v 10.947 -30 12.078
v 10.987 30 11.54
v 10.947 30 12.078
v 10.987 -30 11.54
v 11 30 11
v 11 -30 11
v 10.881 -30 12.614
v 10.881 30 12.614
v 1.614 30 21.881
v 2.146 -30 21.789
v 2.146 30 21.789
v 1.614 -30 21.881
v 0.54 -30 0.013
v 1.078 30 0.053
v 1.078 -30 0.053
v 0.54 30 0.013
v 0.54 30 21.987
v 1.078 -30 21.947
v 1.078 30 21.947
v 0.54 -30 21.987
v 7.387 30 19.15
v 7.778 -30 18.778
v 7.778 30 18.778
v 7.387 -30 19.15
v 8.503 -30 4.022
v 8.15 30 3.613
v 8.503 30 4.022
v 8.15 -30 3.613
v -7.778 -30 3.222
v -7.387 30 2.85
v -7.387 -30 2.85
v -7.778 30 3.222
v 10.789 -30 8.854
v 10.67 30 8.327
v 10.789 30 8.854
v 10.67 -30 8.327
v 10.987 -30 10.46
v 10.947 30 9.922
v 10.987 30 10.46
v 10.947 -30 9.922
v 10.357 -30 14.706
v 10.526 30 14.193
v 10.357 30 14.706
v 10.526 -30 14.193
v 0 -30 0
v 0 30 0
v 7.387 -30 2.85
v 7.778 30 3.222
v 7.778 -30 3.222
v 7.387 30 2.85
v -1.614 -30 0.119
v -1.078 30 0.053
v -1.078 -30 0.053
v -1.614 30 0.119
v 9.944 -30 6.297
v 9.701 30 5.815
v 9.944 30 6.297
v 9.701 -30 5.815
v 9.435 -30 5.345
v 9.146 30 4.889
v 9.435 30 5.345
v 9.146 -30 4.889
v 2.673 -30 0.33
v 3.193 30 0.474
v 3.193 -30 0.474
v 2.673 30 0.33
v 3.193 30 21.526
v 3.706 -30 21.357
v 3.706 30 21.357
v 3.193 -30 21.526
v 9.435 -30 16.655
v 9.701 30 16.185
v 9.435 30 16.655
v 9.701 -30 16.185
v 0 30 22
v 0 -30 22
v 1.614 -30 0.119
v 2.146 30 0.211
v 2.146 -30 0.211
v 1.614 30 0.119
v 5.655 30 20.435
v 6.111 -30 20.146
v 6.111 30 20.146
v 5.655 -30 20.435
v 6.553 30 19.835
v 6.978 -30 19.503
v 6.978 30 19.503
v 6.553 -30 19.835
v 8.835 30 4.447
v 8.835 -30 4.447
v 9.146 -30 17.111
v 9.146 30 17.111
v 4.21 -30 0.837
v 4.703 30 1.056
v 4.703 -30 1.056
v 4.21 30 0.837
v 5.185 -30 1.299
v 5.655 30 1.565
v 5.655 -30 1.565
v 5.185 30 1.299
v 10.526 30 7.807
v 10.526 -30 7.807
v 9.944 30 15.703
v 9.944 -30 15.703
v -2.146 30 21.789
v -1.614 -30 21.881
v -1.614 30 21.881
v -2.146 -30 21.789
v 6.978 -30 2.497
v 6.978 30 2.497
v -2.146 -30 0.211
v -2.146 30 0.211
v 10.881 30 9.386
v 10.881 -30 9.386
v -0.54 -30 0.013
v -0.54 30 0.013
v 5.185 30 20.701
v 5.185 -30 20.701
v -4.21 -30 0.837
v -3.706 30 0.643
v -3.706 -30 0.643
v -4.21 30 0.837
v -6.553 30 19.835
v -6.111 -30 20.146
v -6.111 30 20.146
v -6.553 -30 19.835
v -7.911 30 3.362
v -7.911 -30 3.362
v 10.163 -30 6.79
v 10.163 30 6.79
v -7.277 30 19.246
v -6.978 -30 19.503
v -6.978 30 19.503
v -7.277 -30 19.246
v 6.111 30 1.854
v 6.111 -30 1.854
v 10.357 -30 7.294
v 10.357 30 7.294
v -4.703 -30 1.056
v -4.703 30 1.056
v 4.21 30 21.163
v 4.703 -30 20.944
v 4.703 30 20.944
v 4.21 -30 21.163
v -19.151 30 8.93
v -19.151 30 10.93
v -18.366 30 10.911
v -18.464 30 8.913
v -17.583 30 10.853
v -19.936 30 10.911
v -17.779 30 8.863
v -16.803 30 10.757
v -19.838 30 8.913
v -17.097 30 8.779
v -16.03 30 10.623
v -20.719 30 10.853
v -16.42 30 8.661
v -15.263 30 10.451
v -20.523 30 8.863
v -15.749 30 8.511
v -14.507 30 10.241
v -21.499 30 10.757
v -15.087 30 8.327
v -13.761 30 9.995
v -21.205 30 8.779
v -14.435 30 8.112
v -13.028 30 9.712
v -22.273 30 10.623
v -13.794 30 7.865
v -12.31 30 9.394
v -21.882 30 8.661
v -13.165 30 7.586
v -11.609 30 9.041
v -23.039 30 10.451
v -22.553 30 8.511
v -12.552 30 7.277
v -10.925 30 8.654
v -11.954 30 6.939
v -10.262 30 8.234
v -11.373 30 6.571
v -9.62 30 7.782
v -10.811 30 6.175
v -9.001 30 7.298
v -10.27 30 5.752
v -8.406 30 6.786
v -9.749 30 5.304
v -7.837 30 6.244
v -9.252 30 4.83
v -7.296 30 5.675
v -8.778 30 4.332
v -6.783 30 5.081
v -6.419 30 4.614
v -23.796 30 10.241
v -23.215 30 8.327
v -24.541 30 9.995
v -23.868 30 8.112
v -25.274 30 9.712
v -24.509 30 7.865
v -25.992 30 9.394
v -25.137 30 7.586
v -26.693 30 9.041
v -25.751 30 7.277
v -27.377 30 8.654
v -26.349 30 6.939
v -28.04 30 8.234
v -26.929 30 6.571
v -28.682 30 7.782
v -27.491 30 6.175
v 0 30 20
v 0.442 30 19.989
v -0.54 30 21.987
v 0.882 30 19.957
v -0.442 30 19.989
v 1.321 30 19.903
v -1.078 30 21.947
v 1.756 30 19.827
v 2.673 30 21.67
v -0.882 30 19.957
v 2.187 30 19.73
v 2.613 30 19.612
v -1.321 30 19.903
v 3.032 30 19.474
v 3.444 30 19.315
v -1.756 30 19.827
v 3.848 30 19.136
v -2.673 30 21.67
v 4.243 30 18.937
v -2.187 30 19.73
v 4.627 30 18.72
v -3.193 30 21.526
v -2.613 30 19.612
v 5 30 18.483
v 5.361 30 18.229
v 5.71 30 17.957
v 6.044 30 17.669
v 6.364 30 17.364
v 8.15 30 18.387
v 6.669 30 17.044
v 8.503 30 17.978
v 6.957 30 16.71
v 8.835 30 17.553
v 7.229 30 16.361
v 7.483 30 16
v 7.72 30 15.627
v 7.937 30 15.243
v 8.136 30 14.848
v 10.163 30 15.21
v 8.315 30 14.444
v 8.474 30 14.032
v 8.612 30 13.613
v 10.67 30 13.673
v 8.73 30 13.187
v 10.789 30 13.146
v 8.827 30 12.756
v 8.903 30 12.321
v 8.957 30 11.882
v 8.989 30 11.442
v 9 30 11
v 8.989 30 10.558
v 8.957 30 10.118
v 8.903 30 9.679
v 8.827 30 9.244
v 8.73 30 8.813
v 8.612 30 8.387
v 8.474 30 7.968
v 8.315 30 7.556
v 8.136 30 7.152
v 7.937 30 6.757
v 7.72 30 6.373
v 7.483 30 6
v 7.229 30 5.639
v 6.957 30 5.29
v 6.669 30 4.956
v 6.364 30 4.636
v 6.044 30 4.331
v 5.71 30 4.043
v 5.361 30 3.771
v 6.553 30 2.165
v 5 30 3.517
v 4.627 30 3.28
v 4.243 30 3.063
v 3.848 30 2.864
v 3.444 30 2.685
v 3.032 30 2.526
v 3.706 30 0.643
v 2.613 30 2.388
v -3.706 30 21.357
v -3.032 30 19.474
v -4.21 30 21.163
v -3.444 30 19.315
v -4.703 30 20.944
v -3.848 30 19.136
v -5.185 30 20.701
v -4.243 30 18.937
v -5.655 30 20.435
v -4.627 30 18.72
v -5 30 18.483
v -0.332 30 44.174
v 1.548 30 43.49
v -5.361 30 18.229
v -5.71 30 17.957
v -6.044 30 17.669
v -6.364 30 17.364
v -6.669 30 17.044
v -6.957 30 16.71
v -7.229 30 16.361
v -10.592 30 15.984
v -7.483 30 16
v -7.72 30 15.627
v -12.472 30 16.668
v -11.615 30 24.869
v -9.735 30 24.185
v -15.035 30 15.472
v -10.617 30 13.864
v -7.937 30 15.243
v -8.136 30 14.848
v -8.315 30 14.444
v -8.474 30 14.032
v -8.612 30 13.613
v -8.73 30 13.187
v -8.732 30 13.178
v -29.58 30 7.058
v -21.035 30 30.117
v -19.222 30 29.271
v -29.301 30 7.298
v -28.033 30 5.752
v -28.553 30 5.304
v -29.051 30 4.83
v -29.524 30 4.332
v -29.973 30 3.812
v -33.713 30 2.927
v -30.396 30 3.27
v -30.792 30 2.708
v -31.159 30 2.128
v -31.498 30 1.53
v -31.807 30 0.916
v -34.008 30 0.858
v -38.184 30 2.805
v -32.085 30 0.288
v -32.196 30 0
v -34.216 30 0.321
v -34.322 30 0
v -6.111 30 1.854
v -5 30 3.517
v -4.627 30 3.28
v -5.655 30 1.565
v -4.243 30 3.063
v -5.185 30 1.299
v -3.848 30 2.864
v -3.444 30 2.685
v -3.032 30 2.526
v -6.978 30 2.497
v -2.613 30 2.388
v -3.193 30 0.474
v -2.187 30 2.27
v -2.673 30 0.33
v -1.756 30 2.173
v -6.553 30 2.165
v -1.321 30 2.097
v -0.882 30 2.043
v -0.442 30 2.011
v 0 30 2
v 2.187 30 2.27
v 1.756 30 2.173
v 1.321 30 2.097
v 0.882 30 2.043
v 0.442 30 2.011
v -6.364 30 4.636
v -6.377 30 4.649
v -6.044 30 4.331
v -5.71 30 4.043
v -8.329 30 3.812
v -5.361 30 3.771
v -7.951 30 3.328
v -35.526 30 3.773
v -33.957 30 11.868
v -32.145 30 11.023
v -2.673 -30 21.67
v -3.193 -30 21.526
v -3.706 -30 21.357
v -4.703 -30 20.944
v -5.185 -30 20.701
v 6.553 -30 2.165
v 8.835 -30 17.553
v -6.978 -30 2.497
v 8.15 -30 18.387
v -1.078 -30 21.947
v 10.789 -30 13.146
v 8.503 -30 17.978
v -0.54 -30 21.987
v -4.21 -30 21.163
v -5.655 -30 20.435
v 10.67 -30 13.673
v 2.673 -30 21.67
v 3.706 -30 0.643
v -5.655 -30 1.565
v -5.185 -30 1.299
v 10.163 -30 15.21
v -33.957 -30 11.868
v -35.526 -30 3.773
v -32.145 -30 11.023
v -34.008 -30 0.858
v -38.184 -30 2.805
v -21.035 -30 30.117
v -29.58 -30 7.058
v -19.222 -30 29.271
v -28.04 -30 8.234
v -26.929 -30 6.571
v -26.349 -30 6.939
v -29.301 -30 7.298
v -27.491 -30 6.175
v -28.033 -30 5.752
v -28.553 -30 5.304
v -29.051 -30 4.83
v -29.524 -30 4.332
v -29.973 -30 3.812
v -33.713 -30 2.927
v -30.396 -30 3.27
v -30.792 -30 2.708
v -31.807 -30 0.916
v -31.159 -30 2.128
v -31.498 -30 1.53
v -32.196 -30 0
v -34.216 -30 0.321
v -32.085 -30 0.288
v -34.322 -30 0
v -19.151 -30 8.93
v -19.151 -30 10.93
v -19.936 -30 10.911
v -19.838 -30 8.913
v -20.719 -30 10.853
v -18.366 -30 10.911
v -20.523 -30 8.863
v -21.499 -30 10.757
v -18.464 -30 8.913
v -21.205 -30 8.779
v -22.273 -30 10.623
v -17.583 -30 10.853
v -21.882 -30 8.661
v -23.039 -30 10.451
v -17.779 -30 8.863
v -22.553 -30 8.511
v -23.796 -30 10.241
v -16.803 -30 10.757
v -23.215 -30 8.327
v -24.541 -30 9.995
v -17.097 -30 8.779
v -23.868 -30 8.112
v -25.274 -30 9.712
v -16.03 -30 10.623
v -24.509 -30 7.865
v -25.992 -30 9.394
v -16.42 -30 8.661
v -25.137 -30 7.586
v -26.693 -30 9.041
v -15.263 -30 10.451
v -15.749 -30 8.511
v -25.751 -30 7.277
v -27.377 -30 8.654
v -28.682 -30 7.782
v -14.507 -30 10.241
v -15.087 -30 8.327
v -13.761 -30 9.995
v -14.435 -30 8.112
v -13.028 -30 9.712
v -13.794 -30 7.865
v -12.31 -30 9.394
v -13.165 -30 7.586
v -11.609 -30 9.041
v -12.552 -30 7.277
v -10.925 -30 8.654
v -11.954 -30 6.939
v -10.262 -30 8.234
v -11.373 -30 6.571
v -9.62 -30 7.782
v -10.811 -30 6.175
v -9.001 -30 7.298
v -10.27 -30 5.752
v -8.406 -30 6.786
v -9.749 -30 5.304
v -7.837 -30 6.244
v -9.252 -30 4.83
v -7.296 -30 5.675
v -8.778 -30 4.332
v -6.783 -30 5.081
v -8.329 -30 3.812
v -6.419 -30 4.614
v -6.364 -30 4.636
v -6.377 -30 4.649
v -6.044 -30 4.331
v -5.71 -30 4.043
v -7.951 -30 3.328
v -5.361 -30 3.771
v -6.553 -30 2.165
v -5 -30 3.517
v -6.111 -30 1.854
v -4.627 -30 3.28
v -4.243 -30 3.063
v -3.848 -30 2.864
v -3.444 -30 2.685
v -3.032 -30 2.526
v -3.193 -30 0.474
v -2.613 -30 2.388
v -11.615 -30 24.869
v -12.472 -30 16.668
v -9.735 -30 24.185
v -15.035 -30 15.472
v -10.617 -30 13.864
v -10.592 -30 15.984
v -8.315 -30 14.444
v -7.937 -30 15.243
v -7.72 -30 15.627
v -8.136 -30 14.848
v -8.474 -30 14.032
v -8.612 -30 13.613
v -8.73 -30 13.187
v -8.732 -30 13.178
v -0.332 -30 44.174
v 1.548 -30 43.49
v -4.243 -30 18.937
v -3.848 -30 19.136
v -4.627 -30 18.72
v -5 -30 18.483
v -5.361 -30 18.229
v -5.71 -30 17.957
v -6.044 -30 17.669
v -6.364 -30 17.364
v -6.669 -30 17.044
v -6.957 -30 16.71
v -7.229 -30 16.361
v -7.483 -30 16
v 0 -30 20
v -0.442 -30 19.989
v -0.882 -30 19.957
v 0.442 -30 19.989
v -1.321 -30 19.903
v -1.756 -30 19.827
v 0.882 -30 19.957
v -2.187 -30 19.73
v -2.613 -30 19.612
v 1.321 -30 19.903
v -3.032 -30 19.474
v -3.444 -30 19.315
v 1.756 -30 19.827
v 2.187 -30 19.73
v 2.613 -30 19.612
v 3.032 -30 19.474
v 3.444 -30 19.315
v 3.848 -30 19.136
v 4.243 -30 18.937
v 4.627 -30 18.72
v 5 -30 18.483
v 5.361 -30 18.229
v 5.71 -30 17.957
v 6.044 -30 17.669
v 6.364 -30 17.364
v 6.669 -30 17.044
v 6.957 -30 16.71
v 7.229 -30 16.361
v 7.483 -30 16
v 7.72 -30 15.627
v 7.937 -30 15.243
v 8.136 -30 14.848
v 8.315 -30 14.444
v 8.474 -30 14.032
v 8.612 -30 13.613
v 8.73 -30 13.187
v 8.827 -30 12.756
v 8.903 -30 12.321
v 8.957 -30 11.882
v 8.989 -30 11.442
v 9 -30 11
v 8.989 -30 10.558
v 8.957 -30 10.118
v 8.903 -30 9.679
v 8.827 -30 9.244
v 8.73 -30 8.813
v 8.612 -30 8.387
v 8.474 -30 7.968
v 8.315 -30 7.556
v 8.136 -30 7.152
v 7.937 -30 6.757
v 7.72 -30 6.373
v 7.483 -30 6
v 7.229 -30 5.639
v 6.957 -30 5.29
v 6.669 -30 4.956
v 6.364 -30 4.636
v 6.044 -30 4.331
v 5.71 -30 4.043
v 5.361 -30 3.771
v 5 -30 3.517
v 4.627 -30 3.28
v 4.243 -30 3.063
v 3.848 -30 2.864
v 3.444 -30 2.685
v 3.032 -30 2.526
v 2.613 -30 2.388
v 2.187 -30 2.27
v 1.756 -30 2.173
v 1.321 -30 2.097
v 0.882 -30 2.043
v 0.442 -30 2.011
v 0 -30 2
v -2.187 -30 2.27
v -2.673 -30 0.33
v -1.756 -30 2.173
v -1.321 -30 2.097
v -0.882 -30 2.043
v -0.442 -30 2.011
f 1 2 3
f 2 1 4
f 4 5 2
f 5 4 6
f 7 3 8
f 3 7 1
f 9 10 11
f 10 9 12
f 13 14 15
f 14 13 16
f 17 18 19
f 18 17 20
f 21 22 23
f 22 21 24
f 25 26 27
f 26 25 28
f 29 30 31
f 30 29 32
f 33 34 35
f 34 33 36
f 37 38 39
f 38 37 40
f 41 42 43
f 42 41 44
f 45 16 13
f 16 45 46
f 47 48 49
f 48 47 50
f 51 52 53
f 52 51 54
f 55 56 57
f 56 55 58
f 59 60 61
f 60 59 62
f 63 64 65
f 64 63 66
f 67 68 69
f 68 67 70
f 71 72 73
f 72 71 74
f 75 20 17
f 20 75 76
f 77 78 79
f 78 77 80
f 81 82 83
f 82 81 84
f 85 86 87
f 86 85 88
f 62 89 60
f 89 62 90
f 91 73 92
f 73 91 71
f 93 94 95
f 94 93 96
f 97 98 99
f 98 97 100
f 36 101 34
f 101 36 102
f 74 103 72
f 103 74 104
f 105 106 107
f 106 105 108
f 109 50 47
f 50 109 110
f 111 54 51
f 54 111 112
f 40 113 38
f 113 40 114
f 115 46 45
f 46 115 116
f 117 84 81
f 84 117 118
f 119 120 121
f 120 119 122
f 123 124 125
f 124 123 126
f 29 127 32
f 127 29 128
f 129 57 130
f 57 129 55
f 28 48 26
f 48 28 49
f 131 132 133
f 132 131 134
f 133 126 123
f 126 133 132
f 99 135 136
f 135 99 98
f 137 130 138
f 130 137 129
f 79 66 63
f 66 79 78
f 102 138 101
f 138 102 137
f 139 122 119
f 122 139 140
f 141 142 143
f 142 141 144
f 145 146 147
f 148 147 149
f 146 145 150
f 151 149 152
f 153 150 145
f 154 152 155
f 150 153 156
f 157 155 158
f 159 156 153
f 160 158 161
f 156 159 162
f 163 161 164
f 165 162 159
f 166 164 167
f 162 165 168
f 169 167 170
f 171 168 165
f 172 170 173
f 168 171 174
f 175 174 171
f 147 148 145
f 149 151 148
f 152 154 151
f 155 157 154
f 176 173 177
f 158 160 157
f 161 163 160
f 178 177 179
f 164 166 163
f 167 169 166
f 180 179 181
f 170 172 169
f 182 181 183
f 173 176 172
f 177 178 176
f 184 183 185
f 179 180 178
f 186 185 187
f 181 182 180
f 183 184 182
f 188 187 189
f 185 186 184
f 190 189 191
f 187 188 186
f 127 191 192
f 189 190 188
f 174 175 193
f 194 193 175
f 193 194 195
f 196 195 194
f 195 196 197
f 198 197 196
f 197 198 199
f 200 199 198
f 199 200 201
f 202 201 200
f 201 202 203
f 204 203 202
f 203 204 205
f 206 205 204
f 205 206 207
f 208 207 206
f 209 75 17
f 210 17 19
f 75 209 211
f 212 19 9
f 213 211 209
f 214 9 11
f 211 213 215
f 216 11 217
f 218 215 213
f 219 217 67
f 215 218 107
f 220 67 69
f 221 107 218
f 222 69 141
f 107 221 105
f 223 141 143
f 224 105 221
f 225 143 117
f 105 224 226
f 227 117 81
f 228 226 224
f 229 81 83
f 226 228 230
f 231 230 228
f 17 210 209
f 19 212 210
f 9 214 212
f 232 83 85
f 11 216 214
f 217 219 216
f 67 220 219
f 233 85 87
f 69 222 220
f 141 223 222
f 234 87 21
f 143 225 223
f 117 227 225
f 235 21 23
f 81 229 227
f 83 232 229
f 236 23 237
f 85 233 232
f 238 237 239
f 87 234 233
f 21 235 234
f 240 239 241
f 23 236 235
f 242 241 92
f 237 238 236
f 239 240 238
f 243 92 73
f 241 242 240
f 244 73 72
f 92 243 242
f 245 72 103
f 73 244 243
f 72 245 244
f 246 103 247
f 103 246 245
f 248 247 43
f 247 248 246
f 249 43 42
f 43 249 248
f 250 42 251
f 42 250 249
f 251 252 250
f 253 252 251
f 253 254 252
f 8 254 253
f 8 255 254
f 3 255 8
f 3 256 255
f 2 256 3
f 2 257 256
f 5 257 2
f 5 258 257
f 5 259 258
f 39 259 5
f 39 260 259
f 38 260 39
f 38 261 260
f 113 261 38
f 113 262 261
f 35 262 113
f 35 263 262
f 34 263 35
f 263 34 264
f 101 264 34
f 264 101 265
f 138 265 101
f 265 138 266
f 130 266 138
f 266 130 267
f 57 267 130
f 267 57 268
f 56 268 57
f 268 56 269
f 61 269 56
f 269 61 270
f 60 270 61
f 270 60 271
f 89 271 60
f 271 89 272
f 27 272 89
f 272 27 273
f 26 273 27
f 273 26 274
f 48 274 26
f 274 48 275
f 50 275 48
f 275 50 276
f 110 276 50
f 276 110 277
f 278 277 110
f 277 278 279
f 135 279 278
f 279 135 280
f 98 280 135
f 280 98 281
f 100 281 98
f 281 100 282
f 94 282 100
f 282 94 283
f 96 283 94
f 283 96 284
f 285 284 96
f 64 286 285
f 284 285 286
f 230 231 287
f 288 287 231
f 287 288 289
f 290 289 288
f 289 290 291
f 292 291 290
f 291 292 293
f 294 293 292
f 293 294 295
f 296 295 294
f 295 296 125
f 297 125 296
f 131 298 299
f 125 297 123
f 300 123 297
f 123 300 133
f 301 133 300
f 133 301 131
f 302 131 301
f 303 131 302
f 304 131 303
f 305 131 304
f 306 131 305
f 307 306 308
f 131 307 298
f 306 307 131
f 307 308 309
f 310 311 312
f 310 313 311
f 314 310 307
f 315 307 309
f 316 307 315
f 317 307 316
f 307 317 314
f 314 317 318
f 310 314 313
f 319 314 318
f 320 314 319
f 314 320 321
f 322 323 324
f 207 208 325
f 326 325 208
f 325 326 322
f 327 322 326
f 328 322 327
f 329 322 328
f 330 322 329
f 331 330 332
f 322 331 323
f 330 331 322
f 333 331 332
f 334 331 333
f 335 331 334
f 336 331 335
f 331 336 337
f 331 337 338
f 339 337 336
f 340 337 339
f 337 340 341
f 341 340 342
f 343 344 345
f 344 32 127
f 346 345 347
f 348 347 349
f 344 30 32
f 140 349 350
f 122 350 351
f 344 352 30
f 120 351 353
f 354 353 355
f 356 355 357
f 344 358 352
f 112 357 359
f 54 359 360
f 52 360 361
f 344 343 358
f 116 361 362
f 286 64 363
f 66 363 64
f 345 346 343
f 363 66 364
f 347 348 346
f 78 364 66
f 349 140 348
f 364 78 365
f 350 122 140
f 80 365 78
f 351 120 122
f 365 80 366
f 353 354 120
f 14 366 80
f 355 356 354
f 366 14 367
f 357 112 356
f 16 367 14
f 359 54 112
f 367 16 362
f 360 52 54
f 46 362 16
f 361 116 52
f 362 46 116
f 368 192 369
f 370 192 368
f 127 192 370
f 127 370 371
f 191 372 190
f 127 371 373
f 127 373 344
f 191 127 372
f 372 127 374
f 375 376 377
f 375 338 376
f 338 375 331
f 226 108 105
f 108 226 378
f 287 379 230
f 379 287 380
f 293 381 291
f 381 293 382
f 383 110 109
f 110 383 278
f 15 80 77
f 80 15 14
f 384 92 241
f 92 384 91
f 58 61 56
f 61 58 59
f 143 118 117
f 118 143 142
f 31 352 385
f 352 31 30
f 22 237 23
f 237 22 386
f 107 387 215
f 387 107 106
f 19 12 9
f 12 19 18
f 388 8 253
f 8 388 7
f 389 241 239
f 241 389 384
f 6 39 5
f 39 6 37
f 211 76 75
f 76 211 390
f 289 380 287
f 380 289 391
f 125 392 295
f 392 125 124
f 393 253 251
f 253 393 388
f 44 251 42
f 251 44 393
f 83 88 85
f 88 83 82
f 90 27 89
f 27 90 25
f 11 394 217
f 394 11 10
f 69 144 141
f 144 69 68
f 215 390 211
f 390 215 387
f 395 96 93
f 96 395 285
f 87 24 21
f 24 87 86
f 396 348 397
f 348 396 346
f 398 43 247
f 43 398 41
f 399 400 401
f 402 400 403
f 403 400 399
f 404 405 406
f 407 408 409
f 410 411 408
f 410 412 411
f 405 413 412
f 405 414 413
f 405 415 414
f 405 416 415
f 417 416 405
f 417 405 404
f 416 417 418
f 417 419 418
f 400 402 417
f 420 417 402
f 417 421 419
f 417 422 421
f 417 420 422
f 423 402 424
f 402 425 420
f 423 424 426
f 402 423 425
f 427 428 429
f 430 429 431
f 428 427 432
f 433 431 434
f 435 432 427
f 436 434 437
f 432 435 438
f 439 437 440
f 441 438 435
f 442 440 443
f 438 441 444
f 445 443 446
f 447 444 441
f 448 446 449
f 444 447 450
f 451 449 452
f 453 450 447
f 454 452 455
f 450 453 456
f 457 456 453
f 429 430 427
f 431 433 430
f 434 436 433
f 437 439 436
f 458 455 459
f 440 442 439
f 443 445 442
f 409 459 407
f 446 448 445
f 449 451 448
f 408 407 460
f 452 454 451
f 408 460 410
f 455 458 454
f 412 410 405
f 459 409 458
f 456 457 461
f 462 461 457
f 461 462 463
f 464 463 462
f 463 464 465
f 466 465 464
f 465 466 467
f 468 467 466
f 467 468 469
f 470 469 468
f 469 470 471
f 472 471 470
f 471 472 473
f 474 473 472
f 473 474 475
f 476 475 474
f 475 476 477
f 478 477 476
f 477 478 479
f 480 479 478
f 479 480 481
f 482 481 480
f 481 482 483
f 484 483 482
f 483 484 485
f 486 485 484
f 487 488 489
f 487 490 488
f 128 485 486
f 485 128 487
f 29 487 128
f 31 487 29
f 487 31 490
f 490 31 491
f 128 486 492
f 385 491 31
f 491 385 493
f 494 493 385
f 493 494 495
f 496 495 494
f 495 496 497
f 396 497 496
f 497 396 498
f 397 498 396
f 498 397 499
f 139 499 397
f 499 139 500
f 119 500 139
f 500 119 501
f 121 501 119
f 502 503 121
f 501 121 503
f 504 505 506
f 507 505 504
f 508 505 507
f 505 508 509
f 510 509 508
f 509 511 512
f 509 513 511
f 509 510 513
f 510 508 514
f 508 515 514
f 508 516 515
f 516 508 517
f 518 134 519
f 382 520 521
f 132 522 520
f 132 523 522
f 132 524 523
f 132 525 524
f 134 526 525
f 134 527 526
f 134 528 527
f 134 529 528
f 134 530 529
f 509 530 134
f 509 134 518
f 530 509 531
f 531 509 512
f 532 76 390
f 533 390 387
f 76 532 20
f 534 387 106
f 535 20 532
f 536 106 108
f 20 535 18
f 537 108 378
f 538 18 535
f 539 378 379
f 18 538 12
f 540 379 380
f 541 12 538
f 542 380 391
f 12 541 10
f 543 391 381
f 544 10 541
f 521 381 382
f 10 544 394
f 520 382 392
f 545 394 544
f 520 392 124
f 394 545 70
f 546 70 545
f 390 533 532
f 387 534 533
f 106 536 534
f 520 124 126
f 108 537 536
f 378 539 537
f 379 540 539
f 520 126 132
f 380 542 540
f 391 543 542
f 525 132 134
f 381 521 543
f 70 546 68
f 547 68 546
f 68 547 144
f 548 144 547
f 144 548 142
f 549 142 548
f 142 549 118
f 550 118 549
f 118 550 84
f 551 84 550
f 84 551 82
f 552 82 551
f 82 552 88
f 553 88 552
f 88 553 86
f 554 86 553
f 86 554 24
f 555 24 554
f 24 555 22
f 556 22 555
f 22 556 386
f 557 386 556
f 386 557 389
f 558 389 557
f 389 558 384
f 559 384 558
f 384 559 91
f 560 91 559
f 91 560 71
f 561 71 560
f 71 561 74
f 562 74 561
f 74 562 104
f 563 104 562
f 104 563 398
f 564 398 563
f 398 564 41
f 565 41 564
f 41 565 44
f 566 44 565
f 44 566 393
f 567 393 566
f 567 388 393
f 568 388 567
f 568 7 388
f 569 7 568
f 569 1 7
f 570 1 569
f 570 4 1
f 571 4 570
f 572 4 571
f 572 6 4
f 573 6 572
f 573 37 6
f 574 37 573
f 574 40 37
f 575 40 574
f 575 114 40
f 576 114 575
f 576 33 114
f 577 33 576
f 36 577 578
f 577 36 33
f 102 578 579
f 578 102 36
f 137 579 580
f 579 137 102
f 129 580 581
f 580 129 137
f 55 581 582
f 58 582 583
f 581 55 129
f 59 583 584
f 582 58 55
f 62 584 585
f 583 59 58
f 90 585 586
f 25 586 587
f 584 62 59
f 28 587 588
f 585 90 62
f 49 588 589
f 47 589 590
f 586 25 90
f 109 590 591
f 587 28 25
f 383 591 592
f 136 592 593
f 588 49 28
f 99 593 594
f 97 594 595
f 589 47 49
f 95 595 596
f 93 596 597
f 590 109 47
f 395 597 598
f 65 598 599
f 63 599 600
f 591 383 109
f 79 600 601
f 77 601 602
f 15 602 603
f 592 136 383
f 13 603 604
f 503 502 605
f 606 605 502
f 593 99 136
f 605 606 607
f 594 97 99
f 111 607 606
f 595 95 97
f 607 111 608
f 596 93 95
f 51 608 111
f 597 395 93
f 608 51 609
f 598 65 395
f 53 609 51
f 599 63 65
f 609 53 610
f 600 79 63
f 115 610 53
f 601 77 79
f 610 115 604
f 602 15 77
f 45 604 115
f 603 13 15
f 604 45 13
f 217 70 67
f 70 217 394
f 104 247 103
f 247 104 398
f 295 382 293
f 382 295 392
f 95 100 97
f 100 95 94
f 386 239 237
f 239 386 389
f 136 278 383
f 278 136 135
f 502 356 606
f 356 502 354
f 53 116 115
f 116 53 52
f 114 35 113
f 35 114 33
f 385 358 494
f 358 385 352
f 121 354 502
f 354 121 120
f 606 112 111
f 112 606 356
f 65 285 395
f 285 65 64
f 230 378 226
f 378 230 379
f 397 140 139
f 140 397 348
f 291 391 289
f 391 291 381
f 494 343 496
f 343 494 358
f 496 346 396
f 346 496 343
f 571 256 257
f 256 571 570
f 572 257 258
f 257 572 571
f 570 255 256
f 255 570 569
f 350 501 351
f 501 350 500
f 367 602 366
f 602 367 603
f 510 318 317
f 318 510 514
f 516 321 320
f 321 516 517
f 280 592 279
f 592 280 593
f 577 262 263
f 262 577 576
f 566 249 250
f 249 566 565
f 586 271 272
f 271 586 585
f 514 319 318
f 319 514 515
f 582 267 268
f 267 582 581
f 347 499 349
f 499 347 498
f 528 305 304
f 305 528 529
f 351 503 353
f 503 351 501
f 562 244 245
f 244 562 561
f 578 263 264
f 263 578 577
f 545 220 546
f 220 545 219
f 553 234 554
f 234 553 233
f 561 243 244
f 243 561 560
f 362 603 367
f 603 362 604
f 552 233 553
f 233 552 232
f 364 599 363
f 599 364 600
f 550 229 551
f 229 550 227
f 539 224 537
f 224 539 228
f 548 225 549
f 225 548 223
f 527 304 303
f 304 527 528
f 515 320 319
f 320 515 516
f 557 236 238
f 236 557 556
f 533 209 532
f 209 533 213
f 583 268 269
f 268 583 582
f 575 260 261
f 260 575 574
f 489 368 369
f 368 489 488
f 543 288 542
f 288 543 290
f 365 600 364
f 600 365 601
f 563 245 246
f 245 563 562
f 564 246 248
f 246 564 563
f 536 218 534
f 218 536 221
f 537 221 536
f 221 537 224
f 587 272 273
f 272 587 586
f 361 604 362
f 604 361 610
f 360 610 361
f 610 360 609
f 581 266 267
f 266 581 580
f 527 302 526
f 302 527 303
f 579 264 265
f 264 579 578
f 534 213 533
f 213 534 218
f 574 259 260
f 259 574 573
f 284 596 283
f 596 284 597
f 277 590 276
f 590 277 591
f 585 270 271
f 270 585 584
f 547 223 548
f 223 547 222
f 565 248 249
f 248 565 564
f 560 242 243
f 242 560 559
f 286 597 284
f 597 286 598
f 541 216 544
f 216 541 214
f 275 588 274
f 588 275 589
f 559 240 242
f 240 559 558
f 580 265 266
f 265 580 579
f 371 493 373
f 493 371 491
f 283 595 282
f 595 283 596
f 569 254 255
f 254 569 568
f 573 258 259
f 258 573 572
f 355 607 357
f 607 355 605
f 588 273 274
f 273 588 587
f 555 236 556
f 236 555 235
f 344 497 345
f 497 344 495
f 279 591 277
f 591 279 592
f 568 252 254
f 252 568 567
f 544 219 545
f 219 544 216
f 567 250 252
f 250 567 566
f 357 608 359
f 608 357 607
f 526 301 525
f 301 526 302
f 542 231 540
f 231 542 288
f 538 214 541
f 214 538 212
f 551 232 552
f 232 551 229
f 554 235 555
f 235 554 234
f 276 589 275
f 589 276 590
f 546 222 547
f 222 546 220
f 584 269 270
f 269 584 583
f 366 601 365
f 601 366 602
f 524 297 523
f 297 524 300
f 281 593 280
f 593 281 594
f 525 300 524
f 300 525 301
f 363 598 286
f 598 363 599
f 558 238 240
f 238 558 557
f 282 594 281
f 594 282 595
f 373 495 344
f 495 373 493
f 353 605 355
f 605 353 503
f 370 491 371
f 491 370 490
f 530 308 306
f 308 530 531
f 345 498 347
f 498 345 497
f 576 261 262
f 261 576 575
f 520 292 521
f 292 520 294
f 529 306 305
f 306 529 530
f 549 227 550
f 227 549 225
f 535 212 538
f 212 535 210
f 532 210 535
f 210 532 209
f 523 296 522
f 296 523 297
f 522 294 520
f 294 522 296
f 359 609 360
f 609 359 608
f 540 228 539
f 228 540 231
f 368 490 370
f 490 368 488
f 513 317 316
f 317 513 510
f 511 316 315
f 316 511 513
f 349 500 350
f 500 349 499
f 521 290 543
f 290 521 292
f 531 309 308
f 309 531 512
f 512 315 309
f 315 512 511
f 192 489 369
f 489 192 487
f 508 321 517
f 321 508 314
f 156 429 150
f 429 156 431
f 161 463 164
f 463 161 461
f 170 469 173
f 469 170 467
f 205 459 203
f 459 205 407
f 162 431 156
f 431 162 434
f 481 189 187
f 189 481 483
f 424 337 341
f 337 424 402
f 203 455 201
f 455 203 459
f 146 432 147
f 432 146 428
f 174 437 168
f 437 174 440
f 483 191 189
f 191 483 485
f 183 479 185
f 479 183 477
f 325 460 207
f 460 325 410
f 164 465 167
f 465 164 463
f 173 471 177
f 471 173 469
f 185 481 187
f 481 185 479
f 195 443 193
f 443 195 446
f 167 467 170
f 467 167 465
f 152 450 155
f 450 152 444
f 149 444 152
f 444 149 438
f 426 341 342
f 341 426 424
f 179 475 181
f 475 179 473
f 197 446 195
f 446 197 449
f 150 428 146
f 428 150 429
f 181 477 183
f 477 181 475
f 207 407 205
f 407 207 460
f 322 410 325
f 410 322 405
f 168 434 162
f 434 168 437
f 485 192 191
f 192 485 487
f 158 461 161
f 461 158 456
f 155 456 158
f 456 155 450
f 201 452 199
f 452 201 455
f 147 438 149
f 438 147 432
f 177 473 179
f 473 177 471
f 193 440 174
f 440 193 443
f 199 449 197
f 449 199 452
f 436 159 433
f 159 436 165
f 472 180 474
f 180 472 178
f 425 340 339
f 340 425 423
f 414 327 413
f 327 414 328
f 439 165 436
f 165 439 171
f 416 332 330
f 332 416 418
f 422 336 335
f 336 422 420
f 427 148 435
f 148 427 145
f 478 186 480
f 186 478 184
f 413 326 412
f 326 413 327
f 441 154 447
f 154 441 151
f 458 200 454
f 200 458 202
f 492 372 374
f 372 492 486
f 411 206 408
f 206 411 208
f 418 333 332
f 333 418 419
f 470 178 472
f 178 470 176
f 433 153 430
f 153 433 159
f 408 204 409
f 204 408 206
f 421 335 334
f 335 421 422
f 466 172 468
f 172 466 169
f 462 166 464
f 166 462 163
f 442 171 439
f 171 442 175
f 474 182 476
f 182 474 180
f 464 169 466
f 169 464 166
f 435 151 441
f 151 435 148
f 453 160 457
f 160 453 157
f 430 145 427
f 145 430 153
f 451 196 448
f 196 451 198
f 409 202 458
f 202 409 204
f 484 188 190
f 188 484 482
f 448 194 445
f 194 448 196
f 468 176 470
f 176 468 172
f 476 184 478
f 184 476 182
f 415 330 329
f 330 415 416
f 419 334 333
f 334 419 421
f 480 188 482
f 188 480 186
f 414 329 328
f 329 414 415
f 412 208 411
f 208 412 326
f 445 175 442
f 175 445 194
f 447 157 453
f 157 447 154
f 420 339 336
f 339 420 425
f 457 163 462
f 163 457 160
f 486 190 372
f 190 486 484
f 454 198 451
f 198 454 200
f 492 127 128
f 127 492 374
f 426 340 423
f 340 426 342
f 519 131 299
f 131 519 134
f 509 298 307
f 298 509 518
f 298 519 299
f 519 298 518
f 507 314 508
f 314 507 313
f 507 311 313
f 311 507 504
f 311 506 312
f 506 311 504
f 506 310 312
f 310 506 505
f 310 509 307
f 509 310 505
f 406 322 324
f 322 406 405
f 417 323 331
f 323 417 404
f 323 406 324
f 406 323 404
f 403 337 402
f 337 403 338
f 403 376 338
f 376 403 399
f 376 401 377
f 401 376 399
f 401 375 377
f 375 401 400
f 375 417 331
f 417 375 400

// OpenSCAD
r1 = 10;
beta = 70;
alfa = 40;
gama = 65;
r2 = 15;
card_width = 60 + 2;
card_height = 30;
t = 2;

width = card_width - 2;

S1 = [0, r1];
X = [-cos(alfa)*r1, r1-sin(alfa)*r1];
S2 = [  (r1 + r2)*(X[0] - S1[0])/r1 + S1[0], (r1 + r2)*( X[1] - S1[1])/r1 + S1[1]];

L1 = [S1[0] - cos(90-beta)*(r1*2), S1[1] + sin(90-beta)*(r1*2)];

module tube(r, t, height){
    difference(){
        cylinder(r=r+t/2, h=height, center=true);
        cylinder(r=r-t/2, h=height + 2, center=true);
    }
}

module card_holder(){
    difference(){
        union(){
            translate([t, card_height/2 + t/2, 0])
                cube([t, card_height + t, width], center=true);
            translate([0, card_height/6, 0]) difference() {
                cube([t*3, card_height/3, width], center=true);
            }
        }
        translate([0, card_height/2 + t, 0])
            cube([t, card_height, card_width], center=true);
    }
}

$fn=128;

module holder(){
    difference(){
        translate([S1[0], S1[1] + t/2, 0]) tube(r1, t,width);
    linear_extrude(h=width, center=true)
        polygon(points=[
            S1,
            L1,
            [S1[0]-1000, S1[1]],
            S2
        ], lines=[[0,1,2,3]]);
    }

    difference(){
        translate([S2[0], S2[1] + t/2, 0]) tube(r2, t, width);
        translate([S2[0], S2[1], 0]) rotate([0, 0, asin((S1[1]-S2[1])/(r2+r1))]) hull() for(x=[-r2/2, r2*2]){
            translate([x, -r2/2, 0]) cylinder(r=r2/2, h=width + 2, center=true);
        }
        translate([0, -500, 0]) cube(1000, center=true);
    }

    translate([S1[0], S1[1], 0])
        rotate([0, 0, beta])
        translate([0, r1 + 3*t/2, 0])
        rotate([0, 0, -90])
            card_holder();

    translate([S2[0], S2[1], 0])
        rotate([0, 0, gama])
        translate([0, r2 + 3*t/2, 0])
        rotate([0, 0, -90])
            card_holder();
}

rotate([90, 0, 0]) holder();
